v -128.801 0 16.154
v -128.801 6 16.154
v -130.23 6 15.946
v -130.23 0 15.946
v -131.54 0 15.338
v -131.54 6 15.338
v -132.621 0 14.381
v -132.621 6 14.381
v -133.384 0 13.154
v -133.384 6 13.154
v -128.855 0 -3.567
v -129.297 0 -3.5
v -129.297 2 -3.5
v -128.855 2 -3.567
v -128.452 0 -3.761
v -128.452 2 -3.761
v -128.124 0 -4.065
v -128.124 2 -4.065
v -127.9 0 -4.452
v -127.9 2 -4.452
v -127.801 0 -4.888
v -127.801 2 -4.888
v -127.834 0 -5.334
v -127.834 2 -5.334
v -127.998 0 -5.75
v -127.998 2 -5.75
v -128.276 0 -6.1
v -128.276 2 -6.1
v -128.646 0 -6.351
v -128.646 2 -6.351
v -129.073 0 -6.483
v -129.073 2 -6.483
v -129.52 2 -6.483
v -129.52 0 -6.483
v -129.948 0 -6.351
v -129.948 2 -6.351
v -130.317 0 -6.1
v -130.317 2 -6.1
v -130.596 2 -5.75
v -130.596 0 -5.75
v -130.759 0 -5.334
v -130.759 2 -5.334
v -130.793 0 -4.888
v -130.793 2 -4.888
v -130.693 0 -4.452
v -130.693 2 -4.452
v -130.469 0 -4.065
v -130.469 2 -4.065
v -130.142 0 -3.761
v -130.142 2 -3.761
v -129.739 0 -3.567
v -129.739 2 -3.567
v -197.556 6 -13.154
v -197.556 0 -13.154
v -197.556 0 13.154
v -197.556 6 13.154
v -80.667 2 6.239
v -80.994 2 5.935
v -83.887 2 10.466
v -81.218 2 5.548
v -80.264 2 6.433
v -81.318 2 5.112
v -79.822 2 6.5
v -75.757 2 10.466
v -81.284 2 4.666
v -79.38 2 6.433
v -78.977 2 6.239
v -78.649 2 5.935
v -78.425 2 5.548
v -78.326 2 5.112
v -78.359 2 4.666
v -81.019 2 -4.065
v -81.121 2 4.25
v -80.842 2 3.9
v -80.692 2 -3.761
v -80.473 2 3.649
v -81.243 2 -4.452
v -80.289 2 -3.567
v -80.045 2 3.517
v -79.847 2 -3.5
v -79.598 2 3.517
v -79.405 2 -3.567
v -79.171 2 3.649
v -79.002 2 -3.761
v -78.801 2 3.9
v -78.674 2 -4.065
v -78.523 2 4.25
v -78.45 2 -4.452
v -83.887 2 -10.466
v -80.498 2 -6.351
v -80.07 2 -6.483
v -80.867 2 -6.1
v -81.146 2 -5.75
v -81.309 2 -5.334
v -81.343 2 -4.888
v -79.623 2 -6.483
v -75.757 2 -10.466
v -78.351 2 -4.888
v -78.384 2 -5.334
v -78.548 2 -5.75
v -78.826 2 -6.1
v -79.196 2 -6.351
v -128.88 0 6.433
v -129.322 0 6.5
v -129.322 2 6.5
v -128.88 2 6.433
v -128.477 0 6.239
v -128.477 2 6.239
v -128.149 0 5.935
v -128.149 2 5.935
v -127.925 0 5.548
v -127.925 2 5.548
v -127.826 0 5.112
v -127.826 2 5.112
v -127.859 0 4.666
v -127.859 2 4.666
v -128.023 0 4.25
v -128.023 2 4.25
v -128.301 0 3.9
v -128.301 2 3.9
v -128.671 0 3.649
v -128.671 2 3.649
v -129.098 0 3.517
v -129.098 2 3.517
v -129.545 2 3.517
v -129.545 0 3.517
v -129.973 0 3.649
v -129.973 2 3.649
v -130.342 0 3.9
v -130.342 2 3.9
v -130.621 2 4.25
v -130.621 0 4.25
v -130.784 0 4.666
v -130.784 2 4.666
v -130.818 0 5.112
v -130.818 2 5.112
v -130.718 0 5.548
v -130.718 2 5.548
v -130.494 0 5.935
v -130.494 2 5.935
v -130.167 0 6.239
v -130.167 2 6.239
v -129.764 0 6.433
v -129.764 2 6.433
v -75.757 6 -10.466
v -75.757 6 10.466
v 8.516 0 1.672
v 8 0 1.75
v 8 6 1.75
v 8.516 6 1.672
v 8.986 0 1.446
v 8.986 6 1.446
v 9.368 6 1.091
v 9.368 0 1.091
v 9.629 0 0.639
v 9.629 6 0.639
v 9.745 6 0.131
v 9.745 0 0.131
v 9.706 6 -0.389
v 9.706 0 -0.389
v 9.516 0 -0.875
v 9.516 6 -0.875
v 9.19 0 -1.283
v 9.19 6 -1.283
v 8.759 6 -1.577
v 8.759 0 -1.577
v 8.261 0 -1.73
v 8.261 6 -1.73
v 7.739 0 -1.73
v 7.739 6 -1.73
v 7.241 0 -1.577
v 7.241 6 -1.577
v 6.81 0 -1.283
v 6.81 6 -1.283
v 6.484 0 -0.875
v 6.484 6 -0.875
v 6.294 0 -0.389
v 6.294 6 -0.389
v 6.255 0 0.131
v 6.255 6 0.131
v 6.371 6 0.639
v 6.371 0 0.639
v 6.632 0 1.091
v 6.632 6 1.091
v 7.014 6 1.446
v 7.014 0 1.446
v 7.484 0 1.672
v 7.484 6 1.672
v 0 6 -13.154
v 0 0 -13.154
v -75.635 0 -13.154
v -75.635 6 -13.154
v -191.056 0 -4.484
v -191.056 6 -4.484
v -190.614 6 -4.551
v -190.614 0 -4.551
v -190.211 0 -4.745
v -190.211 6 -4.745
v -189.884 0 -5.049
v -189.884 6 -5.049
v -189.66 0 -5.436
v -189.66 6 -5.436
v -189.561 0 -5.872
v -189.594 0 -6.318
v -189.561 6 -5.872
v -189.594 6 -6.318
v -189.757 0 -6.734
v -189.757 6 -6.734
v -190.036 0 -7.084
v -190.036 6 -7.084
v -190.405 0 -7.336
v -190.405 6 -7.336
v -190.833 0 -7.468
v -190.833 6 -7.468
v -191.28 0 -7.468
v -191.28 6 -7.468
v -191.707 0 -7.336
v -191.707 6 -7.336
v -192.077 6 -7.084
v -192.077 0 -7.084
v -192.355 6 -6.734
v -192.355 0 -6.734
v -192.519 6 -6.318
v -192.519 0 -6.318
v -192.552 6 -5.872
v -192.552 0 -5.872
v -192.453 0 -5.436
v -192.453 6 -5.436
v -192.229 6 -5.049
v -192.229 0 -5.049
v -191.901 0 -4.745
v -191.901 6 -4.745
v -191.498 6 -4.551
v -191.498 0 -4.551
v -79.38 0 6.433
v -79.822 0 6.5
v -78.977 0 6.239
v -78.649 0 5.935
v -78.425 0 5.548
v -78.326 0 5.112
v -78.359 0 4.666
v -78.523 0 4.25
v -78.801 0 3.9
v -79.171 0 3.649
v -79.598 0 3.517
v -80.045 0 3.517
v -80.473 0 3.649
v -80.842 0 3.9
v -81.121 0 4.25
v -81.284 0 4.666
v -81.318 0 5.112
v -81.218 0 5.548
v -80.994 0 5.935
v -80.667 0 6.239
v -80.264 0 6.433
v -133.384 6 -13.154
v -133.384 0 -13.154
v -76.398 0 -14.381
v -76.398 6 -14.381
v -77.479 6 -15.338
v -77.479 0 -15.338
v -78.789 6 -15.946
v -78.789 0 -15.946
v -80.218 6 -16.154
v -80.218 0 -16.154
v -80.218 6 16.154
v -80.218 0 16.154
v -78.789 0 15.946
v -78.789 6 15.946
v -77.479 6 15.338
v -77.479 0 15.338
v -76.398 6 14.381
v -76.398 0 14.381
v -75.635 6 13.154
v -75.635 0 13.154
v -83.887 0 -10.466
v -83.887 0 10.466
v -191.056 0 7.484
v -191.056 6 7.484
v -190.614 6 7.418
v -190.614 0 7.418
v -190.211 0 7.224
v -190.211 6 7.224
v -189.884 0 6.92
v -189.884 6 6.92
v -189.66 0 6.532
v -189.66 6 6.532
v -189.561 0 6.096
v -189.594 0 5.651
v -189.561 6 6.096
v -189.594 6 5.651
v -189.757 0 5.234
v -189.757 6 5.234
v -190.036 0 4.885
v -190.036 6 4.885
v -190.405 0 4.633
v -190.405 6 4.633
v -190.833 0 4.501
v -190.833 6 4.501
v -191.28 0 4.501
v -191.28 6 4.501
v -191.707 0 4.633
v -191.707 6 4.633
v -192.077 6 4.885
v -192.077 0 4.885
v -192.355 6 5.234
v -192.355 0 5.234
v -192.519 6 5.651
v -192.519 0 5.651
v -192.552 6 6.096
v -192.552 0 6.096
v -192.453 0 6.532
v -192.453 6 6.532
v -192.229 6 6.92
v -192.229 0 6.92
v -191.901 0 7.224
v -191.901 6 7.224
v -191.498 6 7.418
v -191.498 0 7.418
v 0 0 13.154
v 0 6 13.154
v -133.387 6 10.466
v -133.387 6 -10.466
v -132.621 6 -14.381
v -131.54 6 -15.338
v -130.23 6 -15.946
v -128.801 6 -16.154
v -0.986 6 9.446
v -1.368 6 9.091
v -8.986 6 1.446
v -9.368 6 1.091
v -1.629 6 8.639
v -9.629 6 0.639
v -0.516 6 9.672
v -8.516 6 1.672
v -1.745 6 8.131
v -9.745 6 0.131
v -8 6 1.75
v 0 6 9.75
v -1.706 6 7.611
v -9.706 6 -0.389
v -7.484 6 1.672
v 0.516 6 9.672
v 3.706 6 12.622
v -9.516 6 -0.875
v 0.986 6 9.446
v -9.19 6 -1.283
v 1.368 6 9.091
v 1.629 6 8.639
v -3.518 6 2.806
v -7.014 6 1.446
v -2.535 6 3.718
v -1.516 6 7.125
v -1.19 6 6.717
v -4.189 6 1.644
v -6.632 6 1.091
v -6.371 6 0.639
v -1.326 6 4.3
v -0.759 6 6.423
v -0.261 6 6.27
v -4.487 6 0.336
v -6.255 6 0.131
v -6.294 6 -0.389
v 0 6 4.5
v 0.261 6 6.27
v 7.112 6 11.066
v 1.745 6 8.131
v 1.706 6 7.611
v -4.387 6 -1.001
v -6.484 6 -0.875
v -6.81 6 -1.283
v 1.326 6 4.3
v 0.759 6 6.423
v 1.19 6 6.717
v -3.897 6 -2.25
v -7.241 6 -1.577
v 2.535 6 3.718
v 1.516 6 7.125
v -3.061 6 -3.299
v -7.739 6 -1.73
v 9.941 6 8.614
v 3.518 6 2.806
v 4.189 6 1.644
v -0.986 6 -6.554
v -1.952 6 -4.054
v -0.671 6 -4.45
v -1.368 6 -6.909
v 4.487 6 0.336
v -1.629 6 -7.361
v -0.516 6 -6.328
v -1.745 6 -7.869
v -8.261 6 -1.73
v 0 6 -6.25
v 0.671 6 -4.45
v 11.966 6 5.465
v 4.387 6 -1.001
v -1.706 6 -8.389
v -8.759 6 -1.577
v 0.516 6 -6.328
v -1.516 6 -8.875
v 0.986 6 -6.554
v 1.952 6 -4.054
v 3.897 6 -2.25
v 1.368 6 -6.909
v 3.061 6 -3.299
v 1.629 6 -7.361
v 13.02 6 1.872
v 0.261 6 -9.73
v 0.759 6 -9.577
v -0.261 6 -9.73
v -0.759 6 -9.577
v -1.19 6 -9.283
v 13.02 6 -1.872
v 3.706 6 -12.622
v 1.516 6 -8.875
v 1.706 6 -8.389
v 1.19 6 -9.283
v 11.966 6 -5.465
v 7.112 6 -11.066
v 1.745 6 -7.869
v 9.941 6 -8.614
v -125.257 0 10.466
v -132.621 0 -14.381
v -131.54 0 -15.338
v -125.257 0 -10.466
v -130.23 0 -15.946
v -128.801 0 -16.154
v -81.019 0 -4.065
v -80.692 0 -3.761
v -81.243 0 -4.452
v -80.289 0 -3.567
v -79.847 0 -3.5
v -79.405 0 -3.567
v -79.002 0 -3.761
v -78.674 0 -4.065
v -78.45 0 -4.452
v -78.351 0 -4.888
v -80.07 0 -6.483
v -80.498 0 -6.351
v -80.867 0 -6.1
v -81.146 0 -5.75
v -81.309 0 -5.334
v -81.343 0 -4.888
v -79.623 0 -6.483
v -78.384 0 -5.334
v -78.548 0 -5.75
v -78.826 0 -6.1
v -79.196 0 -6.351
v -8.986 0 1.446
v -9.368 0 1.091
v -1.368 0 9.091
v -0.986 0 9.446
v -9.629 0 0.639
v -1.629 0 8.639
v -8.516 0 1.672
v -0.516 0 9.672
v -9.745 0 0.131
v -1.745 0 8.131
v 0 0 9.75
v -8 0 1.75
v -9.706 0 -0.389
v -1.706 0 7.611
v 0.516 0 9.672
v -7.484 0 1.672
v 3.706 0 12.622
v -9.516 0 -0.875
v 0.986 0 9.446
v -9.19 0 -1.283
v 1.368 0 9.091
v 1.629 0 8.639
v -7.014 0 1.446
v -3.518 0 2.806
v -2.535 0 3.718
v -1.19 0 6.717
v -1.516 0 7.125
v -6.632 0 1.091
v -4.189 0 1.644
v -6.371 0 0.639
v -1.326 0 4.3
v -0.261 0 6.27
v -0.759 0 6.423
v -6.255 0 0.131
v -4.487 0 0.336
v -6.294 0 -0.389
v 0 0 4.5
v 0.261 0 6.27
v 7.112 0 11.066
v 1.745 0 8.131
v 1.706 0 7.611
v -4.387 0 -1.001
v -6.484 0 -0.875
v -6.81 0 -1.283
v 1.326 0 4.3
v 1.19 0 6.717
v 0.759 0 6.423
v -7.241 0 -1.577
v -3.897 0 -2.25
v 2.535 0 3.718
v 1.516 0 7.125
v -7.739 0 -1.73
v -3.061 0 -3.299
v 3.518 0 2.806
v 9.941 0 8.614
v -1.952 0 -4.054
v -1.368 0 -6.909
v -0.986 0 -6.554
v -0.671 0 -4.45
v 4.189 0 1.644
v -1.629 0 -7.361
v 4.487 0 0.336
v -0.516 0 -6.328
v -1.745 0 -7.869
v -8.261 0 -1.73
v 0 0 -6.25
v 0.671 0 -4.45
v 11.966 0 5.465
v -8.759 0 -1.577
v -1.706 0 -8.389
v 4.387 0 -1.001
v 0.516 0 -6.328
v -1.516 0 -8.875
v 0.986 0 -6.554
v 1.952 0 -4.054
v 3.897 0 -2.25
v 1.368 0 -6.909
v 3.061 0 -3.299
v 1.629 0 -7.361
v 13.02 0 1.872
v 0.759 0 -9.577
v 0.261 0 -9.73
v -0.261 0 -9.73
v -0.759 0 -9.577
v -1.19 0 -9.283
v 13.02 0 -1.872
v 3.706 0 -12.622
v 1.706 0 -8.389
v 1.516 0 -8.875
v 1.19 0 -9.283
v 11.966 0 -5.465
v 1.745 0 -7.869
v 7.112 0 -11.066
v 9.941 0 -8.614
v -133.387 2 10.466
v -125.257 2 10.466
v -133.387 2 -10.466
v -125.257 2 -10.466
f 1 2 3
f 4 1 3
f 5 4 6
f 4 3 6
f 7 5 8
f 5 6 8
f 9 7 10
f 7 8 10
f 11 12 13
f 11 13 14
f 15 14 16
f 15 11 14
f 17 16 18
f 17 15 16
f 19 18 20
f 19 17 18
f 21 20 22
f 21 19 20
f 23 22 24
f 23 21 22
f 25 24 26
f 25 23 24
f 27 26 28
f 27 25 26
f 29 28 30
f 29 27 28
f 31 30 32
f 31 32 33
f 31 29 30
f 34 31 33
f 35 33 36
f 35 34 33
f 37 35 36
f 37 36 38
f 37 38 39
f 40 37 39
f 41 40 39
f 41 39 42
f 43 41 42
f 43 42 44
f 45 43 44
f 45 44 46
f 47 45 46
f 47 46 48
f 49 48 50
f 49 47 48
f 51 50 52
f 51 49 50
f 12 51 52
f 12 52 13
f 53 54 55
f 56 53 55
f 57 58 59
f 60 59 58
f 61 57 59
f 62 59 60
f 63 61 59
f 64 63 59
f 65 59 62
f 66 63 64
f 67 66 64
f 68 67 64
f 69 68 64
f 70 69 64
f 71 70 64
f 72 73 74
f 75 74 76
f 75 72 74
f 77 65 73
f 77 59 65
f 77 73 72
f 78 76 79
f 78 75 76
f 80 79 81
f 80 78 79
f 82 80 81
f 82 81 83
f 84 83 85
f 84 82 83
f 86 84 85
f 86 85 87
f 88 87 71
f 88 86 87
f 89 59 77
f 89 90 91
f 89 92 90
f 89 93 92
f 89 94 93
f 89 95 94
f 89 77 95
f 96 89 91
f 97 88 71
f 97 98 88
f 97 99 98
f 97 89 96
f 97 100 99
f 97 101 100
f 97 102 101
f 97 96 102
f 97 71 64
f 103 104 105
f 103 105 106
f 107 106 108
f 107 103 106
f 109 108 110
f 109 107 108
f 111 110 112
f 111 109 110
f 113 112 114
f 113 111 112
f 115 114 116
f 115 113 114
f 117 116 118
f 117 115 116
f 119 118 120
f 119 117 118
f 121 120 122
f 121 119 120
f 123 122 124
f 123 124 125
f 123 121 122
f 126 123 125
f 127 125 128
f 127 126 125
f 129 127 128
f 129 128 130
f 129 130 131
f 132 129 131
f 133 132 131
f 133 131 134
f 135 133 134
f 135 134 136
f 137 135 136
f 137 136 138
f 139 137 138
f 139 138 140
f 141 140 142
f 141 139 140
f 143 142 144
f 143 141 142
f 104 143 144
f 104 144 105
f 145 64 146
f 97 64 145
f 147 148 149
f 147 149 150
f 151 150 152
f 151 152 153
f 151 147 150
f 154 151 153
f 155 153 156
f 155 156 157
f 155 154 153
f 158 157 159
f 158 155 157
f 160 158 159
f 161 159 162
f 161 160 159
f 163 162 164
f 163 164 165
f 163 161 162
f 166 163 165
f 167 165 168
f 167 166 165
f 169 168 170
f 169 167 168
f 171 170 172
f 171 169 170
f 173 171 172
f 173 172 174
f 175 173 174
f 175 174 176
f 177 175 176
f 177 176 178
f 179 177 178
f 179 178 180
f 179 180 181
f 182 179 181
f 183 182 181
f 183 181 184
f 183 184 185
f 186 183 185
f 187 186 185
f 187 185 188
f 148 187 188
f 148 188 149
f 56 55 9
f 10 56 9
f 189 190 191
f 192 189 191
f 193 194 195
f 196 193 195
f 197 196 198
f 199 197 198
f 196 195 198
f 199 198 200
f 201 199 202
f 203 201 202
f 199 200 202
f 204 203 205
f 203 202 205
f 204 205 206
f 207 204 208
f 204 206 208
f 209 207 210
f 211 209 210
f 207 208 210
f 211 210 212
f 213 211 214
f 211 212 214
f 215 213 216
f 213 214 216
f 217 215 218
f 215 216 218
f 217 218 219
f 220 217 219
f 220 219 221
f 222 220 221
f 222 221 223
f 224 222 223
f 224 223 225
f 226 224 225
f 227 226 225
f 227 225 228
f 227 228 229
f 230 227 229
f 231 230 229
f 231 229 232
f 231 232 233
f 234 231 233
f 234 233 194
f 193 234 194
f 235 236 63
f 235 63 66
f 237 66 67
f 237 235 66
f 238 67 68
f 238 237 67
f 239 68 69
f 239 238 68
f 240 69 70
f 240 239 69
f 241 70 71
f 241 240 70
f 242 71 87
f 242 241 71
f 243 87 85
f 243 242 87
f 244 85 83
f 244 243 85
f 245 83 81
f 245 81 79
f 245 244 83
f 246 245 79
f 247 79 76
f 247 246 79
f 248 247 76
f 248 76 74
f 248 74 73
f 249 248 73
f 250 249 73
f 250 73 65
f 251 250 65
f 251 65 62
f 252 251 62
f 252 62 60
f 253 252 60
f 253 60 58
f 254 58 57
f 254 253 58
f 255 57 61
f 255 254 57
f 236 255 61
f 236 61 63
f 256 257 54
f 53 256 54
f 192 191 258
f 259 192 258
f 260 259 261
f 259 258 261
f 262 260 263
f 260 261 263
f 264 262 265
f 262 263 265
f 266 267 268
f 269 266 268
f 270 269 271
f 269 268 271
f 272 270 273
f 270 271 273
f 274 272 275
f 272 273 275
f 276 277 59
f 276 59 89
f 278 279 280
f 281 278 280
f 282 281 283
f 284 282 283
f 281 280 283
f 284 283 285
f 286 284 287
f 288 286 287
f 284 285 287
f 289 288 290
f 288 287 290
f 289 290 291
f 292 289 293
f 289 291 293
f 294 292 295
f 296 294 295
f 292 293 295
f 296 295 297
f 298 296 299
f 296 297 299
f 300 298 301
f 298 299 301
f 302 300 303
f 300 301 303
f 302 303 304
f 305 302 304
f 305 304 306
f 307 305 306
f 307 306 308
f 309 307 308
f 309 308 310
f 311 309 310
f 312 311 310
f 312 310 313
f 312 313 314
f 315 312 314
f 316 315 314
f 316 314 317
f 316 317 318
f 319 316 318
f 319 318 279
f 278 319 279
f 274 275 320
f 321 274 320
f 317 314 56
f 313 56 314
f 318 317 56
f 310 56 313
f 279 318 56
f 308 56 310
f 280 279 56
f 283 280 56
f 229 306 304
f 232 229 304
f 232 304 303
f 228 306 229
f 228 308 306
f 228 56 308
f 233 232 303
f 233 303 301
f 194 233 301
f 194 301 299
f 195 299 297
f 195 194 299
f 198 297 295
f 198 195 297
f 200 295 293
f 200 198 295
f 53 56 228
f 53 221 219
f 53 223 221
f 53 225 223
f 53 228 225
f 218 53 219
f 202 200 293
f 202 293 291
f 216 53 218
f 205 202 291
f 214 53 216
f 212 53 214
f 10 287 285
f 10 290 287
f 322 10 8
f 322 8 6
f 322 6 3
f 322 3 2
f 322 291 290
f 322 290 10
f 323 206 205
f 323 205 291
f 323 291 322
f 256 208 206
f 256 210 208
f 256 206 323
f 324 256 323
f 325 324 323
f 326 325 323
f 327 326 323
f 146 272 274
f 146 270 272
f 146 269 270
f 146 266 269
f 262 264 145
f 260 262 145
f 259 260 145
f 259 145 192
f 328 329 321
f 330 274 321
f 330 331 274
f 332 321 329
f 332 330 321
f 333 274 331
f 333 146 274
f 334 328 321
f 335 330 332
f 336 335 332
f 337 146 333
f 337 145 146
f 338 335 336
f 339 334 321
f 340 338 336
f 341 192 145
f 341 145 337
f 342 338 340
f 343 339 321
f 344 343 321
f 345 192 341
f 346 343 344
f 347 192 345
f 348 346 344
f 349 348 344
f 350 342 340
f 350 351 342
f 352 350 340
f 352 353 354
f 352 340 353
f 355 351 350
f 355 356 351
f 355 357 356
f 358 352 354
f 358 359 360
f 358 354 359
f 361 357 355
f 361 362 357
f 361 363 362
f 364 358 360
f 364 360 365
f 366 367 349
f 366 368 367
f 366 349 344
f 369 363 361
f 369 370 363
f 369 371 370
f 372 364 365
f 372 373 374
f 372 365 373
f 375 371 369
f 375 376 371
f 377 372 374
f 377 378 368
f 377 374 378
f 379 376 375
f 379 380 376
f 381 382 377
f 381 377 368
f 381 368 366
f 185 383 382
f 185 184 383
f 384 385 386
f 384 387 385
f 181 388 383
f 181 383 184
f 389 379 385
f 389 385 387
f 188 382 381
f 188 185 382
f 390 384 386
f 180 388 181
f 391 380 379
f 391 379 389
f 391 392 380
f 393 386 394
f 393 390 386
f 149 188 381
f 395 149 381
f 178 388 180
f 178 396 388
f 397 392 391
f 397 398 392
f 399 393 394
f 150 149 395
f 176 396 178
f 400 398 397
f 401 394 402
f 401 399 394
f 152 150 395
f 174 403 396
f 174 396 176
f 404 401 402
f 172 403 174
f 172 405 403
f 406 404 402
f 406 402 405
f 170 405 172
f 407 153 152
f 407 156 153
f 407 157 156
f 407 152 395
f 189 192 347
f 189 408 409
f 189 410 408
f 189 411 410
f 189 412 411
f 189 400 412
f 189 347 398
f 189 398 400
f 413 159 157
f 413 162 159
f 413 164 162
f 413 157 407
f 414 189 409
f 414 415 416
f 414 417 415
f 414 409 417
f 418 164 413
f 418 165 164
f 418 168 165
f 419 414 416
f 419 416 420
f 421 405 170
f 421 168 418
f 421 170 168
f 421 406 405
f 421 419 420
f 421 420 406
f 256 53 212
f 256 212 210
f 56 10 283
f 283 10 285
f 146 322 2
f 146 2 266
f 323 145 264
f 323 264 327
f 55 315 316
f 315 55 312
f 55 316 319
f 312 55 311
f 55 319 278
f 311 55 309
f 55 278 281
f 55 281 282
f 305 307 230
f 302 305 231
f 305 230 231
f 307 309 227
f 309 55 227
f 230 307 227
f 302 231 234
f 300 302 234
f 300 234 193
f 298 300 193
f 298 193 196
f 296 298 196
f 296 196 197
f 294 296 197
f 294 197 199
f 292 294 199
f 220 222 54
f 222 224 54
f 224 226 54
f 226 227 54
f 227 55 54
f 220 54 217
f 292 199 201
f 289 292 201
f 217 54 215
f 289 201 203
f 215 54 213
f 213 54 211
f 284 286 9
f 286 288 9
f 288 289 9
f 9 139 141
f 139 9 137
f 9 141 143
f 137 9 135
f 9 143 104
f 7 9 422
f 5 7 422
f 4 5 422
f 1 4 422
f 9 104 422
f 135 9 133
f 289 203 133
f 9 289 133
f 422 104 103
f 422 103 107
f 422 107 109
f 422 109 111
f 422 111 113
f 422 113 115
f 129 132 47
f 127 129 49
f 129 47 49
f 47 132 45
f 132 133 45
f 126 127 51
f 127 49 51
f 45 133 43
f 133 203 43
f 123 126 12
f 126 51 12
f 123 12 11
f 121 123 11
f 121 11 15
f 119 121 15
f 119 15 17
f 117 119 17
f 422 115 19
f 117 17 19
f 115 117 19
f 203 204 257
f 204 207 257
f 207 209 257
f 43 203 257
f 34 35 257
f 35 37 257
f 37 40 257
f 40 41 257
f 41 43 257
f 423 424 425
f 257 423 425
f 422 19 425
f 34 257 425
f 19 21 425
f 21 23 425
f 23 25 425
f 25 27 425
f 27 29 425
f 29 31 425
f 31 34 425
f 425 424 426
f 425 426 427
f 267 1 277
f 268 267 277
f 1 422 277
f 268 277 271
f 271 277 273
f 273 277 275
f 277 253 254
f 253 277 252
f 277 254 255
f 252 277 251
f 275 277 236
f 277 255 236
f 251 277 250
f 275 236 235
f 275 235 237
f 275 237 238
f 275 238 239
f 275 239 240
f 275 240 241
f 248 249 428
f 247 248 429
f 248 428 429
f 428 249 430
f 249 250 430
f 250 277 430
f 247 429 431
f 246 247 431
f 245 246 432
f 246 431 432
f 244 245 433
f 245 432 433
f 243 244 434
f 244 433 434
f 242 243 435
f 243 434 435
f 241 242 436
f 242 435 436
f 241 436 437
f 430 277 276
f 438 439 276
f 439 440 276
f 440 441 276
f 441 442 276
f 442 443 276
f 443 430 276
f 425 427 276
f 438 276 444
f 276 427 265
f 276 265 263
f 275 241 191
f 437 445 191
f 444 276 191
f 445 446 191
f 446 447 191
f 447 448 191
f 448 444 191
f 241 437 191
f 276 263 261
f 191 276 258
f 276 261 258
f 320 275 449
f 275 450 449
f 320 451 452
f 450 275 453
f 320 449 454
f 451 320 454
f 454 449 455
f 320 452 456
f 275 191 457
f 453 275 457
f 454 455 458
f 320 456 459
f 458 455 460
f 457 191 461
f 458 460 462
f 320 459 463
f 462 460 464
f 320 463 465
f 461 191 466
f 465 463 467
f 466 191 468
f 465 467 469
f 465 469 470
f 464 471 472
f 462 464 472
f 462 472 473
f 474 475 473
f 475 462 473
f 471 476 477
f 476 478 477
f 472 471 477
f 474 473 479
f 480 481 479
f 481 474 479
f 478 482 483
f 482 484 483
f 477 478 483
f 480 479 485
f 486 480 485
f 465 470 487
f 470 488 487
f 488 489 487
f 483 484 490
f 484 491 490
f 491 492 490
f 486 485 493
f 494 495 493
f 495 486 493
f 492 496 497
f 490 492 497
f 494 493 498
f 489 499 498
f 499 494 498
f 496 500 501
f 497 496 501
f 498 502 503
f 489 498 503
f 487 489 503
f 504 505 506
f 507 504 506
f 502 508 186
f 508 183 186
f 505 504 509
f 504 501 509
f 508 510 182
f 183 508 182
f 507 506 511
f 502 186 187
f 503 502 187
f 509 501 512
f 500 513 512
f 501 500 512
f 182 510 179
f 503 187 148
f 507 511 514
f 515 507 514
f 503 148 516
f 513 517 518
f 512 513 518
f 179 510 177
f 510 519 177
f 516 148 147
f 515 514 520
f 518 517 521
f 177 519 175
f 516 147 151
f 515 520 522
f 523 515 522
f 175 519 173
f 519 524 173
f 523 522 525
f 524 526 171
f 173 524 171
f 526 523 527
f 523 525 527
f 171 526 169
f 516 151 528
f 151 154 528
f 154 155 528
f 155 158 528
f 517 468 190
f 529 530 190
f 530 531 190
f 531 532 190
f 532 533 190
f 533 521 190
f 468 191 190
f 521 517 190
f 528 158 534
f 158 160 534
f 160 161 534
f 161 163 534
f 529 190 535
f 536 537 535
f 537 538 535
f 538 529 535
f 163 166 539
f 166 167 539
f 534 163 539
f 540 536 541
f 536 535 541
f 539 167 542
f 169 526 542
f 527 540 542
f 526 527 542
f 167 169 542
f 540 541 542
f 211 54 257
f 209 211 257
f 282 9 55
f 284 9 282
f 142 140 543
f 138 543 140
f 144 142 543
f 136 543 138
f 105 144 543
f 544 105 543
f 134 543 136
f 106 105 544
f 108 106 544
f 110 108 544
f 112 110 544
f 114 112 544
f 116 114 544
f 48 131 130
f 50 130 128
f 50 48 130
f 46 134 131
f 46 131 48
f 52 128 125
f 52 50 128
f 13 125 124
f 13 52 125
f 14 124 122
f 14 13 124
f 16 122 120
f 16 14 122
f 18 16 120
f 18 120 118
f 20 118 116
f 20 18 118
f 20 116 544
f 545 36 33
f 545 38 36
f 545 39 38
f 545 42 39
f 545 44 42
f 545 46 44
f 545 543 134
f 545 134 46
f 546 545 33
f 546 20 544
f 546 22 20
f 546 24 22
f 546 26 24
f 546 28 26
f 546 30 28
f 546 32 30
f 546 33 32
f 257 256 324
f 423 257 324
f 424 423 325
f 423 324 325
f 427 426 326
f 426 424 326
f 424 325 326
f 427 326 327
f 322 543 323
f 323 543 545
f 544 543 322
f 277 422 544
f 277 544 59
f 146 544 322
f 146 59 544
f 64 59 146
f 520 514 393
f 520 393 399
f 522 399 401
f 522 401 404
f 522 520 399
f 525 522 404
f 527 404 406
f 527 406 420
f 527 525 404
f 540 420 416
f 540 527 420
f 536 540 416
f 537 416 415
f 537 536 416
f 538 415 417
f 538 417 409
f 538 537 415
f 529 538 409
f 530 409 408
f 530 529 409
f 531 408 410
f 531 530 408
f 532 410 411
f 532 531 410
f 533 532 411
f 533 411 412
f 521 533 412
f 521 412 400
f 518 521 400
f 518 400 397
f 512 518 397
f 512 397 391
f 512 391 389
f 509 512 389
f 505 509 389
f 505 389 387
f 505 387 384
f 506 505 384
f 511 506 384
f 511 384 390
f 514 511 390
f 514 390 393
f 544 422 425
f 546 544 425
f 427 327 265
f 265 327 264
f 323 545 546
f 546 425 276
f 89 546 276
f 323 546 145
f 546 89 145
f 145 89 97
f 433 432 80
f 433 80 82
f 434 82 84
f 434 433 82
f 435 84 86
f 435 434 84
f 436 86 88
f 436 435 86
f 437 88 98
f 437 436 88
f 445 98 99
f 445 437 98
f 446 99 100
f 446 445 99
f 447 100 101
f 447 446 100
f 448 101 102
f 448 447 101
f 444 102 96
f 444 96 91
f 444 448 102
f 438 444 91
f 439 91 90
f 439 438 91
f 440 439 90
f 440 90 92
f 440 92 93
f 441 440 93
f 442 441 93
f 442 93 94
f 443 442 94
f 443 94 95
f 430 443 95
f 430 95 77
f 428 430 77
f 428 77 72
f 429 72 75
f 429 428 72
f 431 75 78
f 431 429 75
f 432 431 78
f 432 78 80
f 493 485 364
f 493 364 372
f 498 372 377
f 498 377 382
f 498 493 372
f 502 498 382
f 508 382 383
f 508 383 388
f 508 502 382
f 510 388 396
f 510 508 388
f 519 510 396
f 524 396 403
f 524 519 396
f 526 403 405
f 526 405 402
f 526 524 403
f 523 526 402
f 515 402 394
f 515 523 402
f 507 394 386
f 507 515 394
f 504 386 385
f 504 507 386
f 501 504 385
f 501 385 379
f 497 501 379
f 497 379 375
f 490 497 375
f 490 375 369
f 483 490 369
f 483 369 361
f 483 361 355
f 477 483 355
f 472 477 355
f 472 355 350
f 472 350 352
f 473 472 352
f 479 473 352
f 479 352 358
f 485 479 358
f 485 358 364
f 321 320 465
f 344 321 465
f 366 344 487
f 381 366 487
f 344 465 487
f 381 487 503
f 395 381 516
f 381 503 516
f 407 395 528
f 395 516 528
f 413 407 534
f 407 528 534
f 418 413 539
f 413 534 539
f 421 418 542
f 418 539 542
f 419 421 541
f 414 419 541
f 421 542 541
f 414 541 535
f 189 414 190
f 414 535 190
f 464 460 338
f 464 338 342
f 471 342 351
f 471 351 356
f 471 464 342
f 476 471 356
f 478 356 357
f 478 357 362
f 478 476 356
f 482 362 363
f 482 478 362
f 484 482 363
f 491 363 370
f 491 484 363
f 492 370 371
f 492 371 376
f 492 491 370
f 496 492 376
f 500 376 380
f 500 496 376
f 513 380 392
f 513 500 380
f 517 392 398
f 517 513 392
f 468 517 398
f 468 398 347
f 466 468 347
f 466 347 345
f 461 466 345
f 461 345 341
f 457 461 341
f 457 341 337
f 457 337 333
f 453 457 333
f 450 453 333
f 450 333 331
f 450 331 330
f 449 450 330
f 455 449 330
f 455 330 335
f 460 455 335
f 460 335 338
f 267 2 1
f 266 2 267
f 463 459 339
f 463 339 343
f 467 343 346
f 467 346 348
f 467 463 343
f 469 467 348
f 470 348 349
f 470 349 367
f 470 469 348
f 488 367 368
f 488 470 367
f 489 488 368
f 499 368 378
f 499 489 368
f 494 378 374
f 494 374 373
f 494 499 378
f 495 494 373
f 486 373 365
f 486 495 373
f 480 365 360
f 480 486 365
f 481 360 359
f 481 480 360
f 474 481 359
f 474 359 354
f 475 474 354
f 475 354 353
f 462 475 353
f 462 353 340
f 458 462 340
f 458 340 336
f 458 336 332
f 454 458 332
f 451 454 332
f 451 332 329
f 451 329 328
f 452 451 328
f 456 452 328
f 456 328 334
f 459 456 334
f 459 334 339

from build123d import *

# Parameters (mm, degrees)
SKETCH1_W            = 57.629592668
SKETCH1_H            = 21.211867522
SKETCH1_R            = 1.75
SKETCH1_R_2          = 4.5
BOSS_EXTRUDE1_DEPTH  = 6
SKETCH1_22_W         = 8.129592668
SKETCH1_22_H         = 21.211867522
SKETCH1_22_R         = 1.5
BOSS_EXTRUDE2_DEPTH  = 2
SKETCH4_W            = 57.748953374
SKETCH4_H            = 6
BOSS_EXTRUDE4_DEPTH  = 3
FILLET2_R            = 5
FILLET2_OF_MIRROR1_R = 5
SKETCH8_R            = 1.5
CUT_EXTRUDE4_DEPTH   = 13


with BuildPart() as part:
    # Sketch1 → Boss-Extrude1 (new body)
    with BuildSketch(Plane(origin=(0, 0, 0), x_dir=(1, 0, 0), z_dir=(0, 1, 0))):
        with BuildLine():
            Line((-197.556308439, -13.154372872), (0, -13.154372872))
            ThreePointArc((0, -13.154372872), (13.154372872, 0), (0, 13.154372872))
            Line((0, 13.154372872), (-197.556308439, 13.154372872))
            Line((-197.556308439, 13.154372872), (-197.556308439, -13.154372872))
        make_face()
        with Locations((-104.57172107, -0.139435446)):
            Rectangle(SKETCH1_W, SKETCH1_H, mode=Mode.SUBTRACT)
        with Locations(Location((0, 8, 0), (0, 0, 270))):
            Circle(SKETCH1_R, mode=Mode.SUBTRACT)
        with Locations(Location((0, -8, 0), (0, 0, 270))):
            Circle(SKETCH1_R, mode=Mode.SUBTRACT)
        with Locations(Location((-8, 0, 0), (0, 0, 270))):
            Circle(SKETCH1_R, mode=Mode.SUBTRACT)
        with Locations(Location((0, 0, 0), (0, 0, 270))):
            Circle(SKETCH1_R_2, mode=Mode.SUBTRACT)
        with Locations(Location((8, 0, 0), (0, 0, 270))):
            Circle(SKETCH1_R, mode=Mode.SUBTRACT)
    boss_extrude1 = extrude(amount=BOSS_EXTRUDE1_DEPTH)

    # Sketch1<22> → Boss-Extrude2 (add)
    # profile 1 of 2: a face of its own
    with BuildSketch(Plane(origin=(0, 0, 0), x_dir=(1, 0, 0), z_dir=(0, 1, 0))):
        with Locations((-129.32172107, -0.139435446)):
            Rectangle(SKETCH1_22_W, SKETCH1_22_H)
        with Locations(Location((-129.32172107, -5, 0), (0, 0, 270))):
            Circle(SKETCH1_22_R, mode=Mode.SUBTRACT)
        with Locations(Location((-129.29672107, 5, 0), (0, 0, 270))):
            Circle(SKETCH1_22_R, mode=Mode.SUBTRACT)
    # profile 2 of 2: a face of its own
    with BuildSketch(Plane(origin=(0, 0, 0), x_dir=(1, 0, 0), z_dir=(0, 1, 0))):
        with Locations((-79.82172107, -0.139435446)):
            Rectangle(SKETCH1_22_W, SKETCH1_22_H)
        with Locations(Location((-79.82172107, -5, 0), (0, 0, 270))):
            Circle(SKETCH1_22_R, mode=Mode.SUBTRACT)
        with Locations(Location((-79.84672107, 5, 0), (0, 0, 270))):
            Circle(SKETCH1_22_R, mode=Mode.SUBTRACT)
    extrude(amount=BOSS_EXTRUDE2_DEPTH)

    # Sketch4 → Boss-Extrude4 (add)
    with BuildSketch(Plane.XY.offset(13.154372872)):
        with Locations((-104.509525291, 3)):
            Rectangle(SKETCH4_W, SKETCH4_H)
    boss_extrude4 = extrude(amount=BOSS_EXTRUDE4_DEPTH)

    # Fillet2
    # the kernel refuses this fillet: 5 mm, written as the material it takes off along each edge
    with BuildSketch(Plane(origin=(-75.635048604, -11.456439237, 16.154372872), x_dir=(0, 0, -1), z_dir=(0, 1, 0)), Plane(origin=(-133.384001978, 17.456439237, 16.154372872), x_dir=(0, 0, -1), z_dir=(0, -1, 0))) as fillet2_piece_1:
        with BuildLine():
            CenterArc((5, 4.582575695), FILLET2_R, 180, 66.421821522)
            Line((0, 4.582575695), (-0.1, 4.582575695))
            Line((-0.1, 4.582575695), (-0.1, 0))
            Line((-0.1, 0), (0, -0.1))
            ThreePointArc((0, -0.1), (1.5, -0.1), (2.96, -0.091651514))
            Line((2.96, -0.091651514), (3, 0))
        make_face()
    extrude(amount=28.912878475, mode=Mode.SUBTRACT)

    # Mirror1: Boss-Extrude1, Boss-Extrude4 across plane
    add(boss_extrude1.mirror(Plane(origin=(0, 0, 0), x_dir=(1, 0, 0), z_dir=(0, 0, -1))))
    add(boss_extrude4.mirror(Plane(origin=(0, 0, 0), x_dir=(1, 0, 0), z_dir=(0, 0, -1))))

    # Fillet2 of Mirror1
    # the kernel refuses this fillet: 5 mm, written as the material it takes off along each edge
    with BuildSketch(Plane(origin=(-75.635048604, -11.456439237, -16.154372872), x_dir=(0, 0, 1), z_dir=(0, 1, 0))) as fillet2_of_mirror1_piece_1:
        with BuildLine():
            CenterArc((5, -4.582575695), FILLET2_OF_MIRROR1_R, 113.578178478, 66.421821522)
            Line((0, -4.582575695), (-0.1, -4.582575695))
            Line((-0.1, -4.582575695), (-0.1, 0))
            Line((-0.1, 0), (0, 0.1))
            ThreePointArc((0, 0.1), (1.5, 0.1), (2.96, 0.091651514))
            Line((2.96, 0.091651514), (3, 0))
        make_face()
    extrude(amount=28.912878475, mode=Mode.SUBTRACT)
    with BuildSketch(Plane(origin=(-133.384001978, 17.456439237, -16.154372872), x_dir=(1, 0, 0), z_dir=(0, -1, 0))) as fillet2_of_mirror1_piece_2:
        with BuildLine():
            CenterArc((4.582575695, 5), FILLET2_OF_MIRROR1_R, 203.578178478, 66.421821522)
            Line((0, 3), (-0.091651514, 2.96))
            ThreePointArc((-0.091651514, 2.96), (-0.1, 1.5), (-0.1, 0))
            Line((-0.1, 0), (0, -0.1))
            Line((0, -0.1), (4.582575695, -0.1))
            Line((4.582575695, -0.1), (4.582575695, 0))
        make_face()
    extrude(amount=28.912878475, mode=Mode.SUBTRACT)

    # Sketch8 → Cut-Extrude4 (cut)
    with BuildSketch(Plane(origin=(0, 6, 0), x_dir=(1, 0, 0), z_dir=(0, 1, 0))):
        with Locations(Location((-191.056308439, -5.984372872, 0), (0, 0, 270))):
            Circle(SKETCH8_R)
        with Locations(Location((-191.056308439, 5.984372872, 0), (0, 0, 270))):
            Circle(SKETCH8_R)
    extrude(amount=-CUT_EXTRUDE4_DEPTH, mode=Mode.SUBTRACT)


solid = part.part
